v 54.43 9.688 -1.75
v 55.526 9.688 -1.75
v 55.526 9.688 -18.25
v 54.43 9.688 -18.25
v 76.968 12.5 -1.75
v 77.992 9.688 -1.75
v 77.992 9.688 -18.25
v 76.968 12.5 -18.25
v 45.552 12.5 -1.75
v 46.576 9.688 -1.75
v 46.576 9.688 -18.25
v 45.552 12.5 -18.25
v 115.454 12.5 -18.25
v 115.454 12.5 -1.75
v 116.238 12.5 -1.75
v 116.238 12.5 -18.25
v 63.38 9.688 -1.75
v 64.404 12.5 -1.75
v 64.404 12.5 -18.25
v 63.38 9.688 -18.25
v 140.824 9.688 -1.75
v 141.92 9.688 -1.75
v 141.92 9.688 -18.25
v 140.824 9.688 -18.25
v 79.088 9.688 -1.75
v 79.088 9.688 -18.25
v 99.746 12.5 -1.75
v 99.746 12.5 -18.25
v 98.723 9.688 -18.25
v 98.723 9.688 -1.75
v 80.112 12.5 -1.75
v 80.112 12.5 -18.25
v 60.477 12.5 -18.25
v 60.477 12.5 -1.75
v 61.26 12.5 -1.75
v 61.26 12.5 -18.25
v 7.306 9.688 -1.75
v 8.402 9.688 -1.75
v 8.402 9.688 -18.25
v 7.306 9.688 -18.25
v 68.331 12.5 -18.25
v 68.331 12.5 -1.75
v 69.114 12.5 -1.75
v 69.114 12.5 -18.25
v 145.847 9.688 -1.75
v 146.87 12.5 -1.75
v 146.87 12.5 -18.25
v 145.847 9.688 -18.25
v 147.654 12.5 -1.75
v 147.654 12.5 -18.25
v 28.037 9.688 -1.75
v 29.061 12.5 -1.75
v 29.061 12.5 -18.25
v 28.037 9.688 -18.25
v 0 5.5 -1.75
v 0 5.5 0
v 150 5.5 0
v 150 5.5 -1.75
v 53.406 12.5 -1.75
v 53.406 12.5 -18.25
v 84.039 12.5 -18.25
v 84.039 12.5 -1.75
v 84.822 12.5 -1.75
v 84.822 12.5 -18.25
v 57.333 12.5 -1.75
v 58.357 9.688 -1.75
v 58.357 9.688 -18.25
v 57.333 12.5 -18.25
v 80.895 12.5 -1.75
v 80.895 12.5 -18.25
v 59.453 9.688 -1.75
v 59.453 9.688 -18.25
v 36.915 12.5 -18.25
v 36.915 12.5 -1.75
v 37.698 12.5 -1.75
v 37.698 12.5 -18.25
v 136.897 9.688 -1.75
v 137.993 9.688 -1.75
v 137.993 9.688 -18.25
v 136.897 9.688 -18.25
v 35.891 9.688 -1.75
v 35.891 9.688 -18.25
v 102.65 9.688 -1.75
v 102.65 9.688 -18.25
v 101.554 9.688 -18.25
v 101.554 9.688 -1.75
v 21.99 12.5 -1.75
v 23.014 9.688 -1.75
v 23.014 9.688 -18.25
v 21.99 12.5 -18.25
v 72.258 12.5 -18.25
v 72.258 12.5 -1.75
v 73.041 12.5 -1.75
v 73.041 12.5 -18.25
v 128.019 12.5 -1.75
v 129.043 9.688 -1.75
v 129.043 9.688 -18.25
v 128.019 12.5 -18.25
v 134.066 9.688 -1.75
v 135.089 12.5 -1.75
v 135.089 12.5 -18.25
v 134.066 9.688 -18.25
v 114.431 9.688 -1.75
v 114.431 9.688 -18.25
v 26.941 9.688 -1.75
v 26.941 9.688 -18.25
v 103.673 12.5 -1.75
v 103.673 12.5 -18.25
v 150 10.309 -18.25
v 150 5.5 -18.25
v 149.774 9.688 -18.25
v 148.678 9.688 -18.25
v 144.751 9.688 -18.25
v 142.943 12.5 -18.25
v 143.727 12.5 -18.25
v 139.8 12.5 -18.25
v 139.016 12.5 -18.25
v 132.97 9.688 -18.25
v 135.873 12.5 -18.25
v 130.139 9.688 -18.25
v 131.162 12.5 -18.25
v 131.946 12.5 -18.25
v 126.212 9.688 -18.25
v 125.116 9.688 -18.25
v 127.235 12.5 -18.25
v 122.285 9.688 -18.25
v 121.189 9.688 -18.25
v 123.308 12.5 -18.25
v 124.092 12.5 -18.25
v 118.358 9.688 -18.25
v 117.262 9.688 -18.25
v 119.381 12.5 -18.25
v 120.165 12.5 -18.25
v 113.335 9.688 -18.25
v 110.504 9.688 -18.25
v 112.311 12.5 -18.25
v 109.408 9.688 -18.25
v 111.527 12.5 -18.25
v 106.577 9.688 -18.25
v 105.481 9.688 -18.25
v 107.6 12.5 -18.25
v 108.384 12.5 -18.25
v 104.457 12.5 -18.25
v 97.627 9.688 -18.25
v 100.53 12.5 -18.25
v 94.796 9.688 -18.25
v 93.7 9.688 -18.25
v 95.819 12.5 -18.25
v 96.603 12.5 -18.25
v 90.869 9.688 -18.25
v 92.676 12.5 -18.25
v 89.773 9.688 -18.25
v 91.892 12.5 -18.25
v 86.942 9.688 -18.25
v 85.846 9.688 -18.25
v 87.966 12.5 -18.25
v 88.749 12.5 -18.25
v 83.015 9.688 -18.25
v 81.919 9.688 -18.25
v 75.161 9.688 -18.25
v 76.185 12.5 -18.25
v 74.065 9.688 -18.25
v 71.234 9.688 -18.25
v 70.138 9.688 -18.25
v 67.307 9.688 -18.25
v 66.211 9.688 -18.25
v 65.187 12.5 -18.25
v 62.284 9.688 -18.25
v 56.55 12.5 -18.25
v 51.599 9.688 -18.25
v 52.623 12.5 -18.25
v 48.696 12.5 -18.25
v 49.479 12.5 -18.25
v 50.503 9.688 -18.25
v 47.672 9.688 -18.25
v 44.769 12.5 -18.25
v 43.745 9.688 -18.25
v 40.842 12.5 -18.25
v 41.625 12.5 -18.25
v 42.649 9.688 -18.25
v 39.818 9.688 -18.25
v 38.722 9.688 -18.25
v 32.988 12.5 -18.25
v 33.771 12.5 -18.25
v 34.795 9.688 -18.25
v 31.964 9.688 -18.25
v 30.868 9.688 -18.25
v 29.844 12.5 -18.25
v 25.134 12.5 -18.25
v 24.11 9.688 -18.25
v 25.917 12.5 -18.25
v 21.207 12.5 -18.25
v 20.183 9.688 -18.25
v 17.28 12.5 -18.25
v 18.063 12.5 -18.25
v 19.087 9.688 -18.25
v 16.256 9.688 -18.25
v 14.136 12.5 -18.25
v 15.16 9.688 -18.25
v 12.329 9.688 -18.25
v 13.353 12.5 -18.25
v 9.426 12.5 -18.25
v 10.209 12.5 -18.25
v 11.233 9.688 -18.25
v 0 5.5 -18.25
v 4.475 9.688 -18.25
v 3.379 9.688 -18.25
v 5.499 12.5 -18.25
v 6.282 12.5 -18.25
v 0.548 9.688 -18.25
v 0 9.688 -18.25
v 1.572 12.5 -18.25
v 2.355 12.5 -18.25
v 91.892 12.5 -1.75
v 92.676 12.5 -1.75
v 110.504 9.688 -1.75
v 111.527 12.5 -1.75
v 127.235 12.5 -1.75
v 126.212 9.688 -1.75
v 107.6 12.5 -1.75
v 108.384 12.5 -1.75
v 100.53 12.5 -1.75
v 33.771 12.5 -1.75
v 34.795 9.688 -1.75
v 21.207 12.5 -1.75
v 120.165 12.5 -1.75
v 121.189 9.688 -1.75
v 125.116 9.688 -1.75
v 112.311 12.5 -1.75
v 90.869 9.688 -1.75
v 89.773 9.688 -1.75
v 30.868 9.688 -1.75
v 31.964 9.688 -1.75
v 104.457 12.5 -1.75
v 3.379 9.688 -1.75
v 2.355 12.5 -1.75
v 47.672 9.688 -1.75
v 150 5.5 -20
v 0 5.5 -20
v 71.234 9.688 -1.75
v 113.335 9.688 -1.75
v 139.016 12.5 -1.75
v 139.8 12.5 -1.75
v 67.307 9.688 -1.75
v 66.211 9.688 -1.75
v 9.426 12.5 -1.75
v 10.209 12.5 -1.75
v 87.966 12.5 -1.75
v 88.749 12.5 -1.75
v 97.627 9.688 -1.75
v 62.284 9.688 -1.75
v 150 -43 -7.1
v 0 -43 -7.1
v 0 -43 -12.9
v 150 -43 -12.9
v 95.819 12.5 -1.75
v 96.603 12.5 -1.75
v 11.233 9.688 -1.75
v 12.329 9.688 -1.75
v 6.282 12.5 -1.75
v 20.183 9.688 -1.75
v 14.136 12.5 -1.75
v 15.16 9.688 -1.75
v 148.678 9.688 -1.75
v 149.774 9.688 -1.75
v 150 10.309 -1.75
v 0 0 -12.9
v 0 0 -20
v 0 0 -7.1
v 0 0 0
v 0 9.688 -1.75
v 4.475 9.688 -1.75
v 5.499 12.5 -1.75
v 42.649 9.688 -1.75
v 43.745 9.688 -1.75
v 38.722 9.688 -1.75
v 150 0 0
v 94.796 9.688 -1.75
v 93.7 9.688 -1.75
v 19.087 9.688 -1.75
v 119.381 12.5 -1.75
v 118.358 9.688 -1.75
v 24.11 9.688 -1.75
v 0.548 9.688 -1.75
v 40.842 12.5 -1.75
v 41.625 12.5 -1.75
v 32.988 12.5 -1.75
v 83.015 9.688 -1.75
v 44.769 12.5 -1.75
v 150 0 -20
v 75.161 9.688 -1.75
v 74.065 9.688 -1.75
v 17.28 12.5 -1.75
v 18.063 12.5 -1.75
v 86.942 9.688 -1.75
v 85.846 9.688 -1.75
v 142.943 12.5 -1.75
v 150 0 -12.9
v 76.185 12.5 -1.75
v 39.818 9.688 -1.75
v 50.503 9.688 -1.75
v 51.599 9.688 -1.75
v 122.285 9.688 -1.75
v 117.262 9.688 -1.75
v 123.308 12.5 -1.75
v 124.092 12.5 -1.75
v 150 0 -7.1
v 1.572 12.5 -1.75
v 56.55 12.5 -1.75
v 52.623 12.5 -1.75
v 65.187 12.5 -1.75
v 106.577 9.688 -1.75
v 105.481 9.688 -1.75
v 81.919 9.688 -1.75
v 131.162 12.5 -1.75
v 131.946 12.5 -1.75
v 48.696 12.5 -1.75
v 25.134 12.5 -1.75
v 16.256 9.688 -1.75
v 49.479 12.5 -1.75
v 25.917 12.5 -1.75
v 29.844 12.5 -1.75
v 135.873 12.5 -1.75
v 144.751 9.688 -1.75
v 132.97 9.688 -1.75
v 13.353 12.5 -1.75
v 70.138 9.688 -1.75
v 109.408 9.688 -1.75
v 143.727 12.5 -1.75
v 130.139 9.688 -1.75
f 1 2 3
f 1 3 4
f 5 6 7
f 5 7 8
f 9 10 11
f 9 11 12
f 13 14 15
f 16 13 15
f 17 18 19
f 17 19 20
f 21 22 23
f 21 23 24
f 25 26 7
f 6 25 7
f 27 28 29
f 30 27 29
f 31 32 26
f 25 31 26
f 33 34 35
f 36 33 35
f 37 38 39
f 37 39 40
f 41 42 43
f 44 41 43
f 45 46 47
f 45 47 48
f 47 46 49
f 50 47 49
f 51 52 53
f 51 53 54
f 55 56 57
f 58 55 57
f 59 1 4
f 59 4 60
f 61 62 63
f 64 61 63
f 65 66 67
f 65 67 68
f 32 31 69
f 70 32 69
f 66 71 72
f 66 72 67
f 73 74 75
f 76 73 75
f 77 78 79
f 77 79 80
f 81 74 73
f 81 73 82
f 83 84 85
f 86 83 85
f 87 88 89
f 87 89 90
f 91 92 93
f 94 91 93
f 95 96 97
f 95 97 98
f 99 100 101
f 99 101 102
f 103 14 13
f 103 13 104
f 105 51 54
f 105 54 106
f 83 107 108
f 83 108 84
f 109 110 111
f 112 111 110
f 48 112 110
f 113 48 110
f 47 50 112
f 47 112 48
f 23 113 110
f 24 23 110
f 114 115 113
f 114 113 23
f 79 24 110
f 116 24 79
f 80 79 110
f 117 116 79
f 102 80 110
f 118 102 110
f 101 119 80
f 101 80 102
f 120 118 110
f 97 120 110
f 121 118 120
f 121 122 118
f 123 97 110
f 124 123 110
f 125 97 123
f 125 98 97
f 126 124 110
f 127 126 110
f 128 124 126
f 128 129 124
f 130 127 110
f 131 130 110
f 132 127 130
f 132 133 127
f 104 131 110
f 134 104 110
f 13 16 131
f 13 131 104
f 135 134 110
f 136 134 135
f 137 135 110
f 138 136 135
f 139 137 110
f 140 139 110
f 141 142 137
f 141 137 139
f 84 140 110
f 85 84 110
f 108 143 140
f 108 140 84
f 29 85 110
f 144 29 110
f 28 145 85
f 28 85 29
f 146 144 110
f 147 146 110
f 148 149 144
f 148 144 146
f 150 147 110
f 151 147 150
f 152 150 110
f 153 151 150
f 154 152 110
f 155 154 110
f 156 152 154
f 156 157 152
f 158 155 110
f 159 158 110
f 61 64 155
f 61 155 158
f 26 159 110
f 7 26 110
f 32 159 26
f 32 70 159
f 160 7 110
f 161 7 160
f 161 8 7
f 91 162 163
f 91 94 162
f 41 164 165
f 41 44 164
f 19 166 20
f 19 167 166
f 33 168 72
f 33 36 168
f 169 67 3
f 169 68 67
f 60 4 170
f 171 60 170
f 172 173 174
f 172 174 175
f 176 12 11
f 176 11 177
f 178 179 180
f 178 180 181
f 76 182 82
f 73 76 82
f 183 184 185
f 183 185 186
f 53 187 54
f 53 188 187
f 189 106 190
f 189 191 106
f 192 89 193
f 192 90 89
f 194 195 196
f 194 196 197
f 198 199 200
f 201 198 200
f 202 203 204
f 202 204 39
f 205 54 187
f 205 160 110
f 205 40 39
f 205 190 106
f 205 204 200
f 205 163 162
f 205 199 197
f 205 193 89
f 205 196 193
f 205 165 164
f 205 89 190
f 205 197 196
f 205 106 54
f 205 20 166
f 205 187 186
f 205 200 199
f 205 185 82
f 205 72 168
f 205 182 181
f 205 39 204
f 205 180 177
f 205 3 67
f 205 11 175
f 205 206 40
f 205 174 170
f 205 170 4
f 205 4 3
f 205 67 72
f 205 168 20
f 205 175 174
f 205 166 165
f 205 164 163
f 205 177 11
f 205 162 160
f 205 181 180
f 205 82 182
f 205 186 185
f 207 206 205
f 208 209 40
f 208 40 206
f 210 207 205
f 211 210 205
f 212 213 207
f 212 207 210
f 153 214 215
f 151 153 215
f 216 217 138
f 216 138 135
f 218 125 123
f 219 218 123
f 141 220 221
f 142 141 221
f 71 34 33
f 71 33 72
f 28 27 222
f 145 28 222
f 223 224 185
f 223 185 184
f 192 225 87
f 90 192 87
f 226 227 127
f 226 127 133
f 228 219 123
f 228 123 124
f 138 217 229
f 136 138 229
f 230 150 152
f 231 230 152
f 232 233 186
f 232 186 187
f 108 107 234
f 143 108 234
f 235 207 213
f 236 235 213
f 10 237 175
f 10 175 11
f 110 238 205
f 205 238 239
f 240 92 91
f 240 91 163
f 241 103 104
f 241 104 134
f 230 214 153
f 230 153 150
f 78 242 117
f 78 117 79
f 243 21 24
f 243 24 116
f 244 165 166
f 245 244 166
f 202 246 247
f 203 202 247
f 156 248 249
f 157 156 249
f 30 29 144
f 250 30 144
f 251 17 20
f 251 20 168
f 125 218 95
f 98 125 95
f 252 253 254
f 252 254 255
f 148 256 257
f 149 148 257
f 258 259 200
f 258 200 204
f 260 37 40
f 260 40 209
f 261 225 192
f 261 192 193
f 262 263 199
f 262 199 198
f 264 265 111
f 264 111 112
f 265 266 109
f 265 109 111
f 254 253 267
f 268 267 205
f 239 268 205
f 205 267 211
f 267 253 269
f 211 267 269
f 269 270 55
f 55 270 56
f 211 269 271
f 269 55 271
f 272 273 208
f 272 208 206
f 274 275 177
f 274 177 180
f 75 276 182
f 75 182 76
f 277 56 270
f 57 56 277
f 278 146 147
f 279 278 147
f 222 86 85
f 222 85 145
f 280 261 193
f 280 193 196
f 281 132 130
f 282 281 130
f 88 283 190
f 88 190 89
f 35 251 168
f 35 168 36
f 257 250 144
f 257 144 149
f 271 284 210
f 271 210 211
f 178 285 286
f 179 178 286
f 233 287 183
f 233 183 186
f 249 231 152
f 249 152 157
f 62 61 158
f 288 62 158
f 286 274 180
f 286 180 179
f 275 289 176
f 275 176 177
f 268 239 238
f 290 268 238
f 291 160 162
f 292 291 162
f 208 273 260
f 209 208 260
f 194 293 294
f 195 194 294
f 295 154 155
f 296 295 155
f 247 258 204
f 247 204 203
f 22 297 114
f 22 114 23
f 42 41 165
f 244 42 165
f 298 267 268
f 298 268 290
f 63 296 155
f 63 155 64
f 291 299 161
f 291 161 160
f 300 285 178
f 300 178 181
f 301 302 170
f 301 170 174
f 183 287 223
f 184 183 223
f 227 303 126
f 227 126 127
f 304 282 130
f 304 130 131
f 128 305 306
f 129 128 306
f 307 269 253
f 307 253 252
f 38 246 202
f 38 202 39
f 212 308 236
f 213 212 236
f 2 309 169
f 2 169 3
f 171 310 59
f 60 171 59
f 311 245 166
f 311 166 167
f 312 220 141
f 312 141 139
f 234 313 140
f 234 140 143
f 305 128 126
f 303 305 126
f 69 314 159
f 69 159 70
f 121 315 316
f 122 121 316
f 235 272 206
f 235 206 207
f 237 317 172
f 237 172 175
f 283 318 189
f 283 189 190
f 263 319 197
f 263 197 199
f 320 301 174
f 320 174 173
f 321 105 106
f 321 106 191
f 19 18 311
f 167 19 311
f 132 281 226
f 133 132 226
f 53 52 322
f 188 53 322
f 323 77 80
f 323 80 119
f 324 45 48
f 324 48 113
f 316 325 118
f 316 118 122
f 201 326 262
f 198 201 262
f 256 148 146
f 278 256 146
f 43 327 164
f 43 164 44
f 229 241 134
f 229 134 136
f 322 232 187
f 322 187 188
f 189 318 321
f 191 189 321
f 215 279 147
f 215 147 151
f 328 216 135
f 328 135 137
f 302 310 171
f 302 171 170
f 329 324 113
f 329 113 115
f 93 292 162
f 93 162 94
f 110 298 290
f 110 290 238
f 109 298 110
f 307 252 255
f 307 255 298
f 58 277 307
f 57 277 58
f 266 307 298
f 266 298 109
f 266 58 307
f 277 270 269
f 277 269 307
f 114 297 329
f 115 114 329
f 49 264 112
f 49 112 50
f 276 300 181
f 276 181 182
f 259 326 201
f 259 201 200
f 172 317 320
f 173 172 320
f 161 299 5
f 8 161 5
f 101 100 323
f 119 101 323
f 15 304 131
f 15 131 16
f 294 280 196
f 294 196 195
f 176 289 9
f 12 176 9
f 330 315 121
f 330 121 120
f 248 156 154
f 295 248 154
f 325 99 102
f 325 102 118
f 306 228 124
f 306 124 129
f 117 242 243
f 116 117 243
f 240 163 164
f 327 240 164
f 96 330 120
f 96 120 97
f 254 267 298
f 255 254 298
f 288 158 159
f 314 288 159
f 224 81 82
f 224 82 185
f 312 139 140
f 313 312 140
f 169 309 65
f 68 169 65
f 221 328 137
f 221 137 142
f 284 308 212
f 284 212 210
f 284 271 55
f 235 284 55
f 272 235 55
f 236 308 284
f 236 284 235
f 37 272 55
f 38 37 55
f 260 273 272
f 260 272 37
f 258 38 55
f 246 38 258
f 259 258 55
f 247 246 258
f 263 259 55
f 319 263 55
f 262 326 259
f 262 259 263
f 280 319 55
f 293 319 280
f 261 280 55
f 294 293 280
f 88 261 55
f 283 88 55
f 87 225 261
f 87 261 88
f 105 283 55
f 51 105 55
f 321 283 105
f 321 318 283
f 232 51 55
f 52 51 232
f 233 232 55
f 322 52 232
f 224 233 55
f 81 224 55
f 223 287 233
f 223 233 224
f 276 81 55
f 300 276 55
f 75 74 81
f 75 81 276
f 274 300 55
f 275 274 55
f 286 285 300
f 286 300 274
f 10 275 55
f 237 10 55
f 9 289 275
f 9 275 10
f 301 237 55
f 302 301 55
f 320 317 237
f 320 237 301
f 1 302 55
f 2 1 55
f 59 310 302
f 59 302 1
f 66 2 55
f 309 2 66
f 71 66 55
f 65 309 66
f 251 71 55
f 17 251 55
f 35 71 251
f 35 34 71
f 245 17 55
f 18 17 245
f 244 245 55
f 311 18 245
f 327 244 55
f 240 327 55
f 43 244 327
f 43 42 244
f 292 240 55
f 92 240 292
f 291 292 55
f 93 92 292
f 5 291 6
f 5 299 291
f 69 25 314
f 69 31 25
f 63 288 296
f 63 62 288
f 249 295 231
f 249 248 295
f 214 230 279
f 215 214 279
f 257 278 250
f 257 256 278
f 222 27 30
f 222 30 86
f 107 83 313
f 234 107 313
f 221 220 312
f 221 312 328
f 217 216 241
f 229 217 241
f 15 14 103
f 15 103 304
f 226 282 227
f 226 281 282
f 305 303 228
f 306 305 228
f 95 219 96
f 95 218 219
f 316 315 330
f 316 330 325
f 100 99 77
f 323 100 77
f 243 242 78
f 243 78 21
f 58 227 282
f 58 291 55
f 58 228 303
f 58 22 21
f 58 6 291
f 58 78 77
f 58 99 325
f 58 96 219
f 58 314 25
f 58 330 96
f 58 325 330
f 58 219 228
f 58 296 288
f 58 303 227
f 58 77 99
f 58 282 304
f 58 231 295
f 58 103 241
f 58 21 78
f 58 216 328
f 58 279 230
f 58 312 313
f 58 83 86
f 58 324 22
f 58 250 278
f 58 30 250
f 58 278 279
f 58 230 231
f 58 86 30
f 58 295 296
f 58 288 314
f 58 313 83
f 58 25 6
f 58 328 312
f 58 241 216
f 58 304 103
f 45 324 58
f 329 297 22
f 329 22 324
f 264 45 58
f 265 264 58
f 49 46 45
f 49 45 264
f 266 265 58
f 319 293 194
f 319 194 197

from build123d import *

# Parameters (mm, degrees)
BLANKSKE_W              = 150
BLANKSKE_H              = 12.5
BLANK_DEPTH             = 20
TOOTHCUTSIM_DEPTH       = 152.842846391
TEETHCUTS_COUNT         = 39
TEETHCUTS_PITCH         = 3.926990813
CROQUIS3_W              = 150.577281711
CROQUIS3_H              = 7.352719699
CORTAR_EXTRUIR1_DEPTH   = 1.75
CROQUIS4_W              = 150
CROQUIS4_H              = 8.901496228
CORTAR_EXTRUIR2_DEPTH   = 1.75
CROQUIS6_W              = 150
CROQUIS6_H              = 5.8
SALIENTE_EXTRUIR1_DEPTH = 43


with BuildPart() as part:
    # BlankSke → Blank (new body)
    with BuildSketch(Plane.XY):
        with Locations((75, 6.25)):
            Rectangle(BLANKSKE_W, BLANKSKE_H)
    extrude(amount=-BLANK_DEPTH)

    # TooCutSkeSim → ToothCutSim (cut, through all)
    with BuildSketch(Plane.XY):
        Polygon((0.548044212, 9.6875), (-0.548044212, 9.6875), (-1.58095534, 12.5254), (1.58095534, 12.5254), align=None)
    toothcutsim = extrude(amount=-TOOTHCUTSIM_DEPTH, mode=Mode.SUBTRACT)

    # TeethCuts: ToothCutSim ×39
    with Locations(*[(i * TEETHCUTS_PITCH, 0, 0) for i in range(1, TEETHCUTS_COUNT)]):
        add(toothcutsim, mode=Mode.SUBTRACT)

    # Croquis3 → Cortar-Extruir1 (cut)
    with BuildSketch(Plane.XY):
        with Locations((75.288640856, 9.17635985)):
            Rectangle(CROQUIS3_W, CROQUIS3_H)
    extrude(amount=-CORTAR_EXTRUIR1_DEPTH, mode=Mode.SUBTRACT)

    # Croquis4 → Cortar-Extruir2 (cut)
    with BuildSketch(Plane(origin=(0, 0, -20), x_dir=(-1, 0, 0), z_dir=(0, 0, -1))):
        with Locations((-75, 9.950748114)):
            Rectangle(CROQUIS4_W, CROQUIS4_H)
    extrude(amount=-CORTAR_EXTRUIR2_DEPTH, mode=Mode.SUBTRACT)

    # Croquis6 → Saliente-Extruir1 (add)
    with BuildSketch(Plane.XZ):
        with Locations((75, -10)):
            Rectangle(CROQUIS6_W, CROQUIS6_H)
    extrude(amount=SALIENTE_EXTRUIR1_DEPTH)


solid = part.part
